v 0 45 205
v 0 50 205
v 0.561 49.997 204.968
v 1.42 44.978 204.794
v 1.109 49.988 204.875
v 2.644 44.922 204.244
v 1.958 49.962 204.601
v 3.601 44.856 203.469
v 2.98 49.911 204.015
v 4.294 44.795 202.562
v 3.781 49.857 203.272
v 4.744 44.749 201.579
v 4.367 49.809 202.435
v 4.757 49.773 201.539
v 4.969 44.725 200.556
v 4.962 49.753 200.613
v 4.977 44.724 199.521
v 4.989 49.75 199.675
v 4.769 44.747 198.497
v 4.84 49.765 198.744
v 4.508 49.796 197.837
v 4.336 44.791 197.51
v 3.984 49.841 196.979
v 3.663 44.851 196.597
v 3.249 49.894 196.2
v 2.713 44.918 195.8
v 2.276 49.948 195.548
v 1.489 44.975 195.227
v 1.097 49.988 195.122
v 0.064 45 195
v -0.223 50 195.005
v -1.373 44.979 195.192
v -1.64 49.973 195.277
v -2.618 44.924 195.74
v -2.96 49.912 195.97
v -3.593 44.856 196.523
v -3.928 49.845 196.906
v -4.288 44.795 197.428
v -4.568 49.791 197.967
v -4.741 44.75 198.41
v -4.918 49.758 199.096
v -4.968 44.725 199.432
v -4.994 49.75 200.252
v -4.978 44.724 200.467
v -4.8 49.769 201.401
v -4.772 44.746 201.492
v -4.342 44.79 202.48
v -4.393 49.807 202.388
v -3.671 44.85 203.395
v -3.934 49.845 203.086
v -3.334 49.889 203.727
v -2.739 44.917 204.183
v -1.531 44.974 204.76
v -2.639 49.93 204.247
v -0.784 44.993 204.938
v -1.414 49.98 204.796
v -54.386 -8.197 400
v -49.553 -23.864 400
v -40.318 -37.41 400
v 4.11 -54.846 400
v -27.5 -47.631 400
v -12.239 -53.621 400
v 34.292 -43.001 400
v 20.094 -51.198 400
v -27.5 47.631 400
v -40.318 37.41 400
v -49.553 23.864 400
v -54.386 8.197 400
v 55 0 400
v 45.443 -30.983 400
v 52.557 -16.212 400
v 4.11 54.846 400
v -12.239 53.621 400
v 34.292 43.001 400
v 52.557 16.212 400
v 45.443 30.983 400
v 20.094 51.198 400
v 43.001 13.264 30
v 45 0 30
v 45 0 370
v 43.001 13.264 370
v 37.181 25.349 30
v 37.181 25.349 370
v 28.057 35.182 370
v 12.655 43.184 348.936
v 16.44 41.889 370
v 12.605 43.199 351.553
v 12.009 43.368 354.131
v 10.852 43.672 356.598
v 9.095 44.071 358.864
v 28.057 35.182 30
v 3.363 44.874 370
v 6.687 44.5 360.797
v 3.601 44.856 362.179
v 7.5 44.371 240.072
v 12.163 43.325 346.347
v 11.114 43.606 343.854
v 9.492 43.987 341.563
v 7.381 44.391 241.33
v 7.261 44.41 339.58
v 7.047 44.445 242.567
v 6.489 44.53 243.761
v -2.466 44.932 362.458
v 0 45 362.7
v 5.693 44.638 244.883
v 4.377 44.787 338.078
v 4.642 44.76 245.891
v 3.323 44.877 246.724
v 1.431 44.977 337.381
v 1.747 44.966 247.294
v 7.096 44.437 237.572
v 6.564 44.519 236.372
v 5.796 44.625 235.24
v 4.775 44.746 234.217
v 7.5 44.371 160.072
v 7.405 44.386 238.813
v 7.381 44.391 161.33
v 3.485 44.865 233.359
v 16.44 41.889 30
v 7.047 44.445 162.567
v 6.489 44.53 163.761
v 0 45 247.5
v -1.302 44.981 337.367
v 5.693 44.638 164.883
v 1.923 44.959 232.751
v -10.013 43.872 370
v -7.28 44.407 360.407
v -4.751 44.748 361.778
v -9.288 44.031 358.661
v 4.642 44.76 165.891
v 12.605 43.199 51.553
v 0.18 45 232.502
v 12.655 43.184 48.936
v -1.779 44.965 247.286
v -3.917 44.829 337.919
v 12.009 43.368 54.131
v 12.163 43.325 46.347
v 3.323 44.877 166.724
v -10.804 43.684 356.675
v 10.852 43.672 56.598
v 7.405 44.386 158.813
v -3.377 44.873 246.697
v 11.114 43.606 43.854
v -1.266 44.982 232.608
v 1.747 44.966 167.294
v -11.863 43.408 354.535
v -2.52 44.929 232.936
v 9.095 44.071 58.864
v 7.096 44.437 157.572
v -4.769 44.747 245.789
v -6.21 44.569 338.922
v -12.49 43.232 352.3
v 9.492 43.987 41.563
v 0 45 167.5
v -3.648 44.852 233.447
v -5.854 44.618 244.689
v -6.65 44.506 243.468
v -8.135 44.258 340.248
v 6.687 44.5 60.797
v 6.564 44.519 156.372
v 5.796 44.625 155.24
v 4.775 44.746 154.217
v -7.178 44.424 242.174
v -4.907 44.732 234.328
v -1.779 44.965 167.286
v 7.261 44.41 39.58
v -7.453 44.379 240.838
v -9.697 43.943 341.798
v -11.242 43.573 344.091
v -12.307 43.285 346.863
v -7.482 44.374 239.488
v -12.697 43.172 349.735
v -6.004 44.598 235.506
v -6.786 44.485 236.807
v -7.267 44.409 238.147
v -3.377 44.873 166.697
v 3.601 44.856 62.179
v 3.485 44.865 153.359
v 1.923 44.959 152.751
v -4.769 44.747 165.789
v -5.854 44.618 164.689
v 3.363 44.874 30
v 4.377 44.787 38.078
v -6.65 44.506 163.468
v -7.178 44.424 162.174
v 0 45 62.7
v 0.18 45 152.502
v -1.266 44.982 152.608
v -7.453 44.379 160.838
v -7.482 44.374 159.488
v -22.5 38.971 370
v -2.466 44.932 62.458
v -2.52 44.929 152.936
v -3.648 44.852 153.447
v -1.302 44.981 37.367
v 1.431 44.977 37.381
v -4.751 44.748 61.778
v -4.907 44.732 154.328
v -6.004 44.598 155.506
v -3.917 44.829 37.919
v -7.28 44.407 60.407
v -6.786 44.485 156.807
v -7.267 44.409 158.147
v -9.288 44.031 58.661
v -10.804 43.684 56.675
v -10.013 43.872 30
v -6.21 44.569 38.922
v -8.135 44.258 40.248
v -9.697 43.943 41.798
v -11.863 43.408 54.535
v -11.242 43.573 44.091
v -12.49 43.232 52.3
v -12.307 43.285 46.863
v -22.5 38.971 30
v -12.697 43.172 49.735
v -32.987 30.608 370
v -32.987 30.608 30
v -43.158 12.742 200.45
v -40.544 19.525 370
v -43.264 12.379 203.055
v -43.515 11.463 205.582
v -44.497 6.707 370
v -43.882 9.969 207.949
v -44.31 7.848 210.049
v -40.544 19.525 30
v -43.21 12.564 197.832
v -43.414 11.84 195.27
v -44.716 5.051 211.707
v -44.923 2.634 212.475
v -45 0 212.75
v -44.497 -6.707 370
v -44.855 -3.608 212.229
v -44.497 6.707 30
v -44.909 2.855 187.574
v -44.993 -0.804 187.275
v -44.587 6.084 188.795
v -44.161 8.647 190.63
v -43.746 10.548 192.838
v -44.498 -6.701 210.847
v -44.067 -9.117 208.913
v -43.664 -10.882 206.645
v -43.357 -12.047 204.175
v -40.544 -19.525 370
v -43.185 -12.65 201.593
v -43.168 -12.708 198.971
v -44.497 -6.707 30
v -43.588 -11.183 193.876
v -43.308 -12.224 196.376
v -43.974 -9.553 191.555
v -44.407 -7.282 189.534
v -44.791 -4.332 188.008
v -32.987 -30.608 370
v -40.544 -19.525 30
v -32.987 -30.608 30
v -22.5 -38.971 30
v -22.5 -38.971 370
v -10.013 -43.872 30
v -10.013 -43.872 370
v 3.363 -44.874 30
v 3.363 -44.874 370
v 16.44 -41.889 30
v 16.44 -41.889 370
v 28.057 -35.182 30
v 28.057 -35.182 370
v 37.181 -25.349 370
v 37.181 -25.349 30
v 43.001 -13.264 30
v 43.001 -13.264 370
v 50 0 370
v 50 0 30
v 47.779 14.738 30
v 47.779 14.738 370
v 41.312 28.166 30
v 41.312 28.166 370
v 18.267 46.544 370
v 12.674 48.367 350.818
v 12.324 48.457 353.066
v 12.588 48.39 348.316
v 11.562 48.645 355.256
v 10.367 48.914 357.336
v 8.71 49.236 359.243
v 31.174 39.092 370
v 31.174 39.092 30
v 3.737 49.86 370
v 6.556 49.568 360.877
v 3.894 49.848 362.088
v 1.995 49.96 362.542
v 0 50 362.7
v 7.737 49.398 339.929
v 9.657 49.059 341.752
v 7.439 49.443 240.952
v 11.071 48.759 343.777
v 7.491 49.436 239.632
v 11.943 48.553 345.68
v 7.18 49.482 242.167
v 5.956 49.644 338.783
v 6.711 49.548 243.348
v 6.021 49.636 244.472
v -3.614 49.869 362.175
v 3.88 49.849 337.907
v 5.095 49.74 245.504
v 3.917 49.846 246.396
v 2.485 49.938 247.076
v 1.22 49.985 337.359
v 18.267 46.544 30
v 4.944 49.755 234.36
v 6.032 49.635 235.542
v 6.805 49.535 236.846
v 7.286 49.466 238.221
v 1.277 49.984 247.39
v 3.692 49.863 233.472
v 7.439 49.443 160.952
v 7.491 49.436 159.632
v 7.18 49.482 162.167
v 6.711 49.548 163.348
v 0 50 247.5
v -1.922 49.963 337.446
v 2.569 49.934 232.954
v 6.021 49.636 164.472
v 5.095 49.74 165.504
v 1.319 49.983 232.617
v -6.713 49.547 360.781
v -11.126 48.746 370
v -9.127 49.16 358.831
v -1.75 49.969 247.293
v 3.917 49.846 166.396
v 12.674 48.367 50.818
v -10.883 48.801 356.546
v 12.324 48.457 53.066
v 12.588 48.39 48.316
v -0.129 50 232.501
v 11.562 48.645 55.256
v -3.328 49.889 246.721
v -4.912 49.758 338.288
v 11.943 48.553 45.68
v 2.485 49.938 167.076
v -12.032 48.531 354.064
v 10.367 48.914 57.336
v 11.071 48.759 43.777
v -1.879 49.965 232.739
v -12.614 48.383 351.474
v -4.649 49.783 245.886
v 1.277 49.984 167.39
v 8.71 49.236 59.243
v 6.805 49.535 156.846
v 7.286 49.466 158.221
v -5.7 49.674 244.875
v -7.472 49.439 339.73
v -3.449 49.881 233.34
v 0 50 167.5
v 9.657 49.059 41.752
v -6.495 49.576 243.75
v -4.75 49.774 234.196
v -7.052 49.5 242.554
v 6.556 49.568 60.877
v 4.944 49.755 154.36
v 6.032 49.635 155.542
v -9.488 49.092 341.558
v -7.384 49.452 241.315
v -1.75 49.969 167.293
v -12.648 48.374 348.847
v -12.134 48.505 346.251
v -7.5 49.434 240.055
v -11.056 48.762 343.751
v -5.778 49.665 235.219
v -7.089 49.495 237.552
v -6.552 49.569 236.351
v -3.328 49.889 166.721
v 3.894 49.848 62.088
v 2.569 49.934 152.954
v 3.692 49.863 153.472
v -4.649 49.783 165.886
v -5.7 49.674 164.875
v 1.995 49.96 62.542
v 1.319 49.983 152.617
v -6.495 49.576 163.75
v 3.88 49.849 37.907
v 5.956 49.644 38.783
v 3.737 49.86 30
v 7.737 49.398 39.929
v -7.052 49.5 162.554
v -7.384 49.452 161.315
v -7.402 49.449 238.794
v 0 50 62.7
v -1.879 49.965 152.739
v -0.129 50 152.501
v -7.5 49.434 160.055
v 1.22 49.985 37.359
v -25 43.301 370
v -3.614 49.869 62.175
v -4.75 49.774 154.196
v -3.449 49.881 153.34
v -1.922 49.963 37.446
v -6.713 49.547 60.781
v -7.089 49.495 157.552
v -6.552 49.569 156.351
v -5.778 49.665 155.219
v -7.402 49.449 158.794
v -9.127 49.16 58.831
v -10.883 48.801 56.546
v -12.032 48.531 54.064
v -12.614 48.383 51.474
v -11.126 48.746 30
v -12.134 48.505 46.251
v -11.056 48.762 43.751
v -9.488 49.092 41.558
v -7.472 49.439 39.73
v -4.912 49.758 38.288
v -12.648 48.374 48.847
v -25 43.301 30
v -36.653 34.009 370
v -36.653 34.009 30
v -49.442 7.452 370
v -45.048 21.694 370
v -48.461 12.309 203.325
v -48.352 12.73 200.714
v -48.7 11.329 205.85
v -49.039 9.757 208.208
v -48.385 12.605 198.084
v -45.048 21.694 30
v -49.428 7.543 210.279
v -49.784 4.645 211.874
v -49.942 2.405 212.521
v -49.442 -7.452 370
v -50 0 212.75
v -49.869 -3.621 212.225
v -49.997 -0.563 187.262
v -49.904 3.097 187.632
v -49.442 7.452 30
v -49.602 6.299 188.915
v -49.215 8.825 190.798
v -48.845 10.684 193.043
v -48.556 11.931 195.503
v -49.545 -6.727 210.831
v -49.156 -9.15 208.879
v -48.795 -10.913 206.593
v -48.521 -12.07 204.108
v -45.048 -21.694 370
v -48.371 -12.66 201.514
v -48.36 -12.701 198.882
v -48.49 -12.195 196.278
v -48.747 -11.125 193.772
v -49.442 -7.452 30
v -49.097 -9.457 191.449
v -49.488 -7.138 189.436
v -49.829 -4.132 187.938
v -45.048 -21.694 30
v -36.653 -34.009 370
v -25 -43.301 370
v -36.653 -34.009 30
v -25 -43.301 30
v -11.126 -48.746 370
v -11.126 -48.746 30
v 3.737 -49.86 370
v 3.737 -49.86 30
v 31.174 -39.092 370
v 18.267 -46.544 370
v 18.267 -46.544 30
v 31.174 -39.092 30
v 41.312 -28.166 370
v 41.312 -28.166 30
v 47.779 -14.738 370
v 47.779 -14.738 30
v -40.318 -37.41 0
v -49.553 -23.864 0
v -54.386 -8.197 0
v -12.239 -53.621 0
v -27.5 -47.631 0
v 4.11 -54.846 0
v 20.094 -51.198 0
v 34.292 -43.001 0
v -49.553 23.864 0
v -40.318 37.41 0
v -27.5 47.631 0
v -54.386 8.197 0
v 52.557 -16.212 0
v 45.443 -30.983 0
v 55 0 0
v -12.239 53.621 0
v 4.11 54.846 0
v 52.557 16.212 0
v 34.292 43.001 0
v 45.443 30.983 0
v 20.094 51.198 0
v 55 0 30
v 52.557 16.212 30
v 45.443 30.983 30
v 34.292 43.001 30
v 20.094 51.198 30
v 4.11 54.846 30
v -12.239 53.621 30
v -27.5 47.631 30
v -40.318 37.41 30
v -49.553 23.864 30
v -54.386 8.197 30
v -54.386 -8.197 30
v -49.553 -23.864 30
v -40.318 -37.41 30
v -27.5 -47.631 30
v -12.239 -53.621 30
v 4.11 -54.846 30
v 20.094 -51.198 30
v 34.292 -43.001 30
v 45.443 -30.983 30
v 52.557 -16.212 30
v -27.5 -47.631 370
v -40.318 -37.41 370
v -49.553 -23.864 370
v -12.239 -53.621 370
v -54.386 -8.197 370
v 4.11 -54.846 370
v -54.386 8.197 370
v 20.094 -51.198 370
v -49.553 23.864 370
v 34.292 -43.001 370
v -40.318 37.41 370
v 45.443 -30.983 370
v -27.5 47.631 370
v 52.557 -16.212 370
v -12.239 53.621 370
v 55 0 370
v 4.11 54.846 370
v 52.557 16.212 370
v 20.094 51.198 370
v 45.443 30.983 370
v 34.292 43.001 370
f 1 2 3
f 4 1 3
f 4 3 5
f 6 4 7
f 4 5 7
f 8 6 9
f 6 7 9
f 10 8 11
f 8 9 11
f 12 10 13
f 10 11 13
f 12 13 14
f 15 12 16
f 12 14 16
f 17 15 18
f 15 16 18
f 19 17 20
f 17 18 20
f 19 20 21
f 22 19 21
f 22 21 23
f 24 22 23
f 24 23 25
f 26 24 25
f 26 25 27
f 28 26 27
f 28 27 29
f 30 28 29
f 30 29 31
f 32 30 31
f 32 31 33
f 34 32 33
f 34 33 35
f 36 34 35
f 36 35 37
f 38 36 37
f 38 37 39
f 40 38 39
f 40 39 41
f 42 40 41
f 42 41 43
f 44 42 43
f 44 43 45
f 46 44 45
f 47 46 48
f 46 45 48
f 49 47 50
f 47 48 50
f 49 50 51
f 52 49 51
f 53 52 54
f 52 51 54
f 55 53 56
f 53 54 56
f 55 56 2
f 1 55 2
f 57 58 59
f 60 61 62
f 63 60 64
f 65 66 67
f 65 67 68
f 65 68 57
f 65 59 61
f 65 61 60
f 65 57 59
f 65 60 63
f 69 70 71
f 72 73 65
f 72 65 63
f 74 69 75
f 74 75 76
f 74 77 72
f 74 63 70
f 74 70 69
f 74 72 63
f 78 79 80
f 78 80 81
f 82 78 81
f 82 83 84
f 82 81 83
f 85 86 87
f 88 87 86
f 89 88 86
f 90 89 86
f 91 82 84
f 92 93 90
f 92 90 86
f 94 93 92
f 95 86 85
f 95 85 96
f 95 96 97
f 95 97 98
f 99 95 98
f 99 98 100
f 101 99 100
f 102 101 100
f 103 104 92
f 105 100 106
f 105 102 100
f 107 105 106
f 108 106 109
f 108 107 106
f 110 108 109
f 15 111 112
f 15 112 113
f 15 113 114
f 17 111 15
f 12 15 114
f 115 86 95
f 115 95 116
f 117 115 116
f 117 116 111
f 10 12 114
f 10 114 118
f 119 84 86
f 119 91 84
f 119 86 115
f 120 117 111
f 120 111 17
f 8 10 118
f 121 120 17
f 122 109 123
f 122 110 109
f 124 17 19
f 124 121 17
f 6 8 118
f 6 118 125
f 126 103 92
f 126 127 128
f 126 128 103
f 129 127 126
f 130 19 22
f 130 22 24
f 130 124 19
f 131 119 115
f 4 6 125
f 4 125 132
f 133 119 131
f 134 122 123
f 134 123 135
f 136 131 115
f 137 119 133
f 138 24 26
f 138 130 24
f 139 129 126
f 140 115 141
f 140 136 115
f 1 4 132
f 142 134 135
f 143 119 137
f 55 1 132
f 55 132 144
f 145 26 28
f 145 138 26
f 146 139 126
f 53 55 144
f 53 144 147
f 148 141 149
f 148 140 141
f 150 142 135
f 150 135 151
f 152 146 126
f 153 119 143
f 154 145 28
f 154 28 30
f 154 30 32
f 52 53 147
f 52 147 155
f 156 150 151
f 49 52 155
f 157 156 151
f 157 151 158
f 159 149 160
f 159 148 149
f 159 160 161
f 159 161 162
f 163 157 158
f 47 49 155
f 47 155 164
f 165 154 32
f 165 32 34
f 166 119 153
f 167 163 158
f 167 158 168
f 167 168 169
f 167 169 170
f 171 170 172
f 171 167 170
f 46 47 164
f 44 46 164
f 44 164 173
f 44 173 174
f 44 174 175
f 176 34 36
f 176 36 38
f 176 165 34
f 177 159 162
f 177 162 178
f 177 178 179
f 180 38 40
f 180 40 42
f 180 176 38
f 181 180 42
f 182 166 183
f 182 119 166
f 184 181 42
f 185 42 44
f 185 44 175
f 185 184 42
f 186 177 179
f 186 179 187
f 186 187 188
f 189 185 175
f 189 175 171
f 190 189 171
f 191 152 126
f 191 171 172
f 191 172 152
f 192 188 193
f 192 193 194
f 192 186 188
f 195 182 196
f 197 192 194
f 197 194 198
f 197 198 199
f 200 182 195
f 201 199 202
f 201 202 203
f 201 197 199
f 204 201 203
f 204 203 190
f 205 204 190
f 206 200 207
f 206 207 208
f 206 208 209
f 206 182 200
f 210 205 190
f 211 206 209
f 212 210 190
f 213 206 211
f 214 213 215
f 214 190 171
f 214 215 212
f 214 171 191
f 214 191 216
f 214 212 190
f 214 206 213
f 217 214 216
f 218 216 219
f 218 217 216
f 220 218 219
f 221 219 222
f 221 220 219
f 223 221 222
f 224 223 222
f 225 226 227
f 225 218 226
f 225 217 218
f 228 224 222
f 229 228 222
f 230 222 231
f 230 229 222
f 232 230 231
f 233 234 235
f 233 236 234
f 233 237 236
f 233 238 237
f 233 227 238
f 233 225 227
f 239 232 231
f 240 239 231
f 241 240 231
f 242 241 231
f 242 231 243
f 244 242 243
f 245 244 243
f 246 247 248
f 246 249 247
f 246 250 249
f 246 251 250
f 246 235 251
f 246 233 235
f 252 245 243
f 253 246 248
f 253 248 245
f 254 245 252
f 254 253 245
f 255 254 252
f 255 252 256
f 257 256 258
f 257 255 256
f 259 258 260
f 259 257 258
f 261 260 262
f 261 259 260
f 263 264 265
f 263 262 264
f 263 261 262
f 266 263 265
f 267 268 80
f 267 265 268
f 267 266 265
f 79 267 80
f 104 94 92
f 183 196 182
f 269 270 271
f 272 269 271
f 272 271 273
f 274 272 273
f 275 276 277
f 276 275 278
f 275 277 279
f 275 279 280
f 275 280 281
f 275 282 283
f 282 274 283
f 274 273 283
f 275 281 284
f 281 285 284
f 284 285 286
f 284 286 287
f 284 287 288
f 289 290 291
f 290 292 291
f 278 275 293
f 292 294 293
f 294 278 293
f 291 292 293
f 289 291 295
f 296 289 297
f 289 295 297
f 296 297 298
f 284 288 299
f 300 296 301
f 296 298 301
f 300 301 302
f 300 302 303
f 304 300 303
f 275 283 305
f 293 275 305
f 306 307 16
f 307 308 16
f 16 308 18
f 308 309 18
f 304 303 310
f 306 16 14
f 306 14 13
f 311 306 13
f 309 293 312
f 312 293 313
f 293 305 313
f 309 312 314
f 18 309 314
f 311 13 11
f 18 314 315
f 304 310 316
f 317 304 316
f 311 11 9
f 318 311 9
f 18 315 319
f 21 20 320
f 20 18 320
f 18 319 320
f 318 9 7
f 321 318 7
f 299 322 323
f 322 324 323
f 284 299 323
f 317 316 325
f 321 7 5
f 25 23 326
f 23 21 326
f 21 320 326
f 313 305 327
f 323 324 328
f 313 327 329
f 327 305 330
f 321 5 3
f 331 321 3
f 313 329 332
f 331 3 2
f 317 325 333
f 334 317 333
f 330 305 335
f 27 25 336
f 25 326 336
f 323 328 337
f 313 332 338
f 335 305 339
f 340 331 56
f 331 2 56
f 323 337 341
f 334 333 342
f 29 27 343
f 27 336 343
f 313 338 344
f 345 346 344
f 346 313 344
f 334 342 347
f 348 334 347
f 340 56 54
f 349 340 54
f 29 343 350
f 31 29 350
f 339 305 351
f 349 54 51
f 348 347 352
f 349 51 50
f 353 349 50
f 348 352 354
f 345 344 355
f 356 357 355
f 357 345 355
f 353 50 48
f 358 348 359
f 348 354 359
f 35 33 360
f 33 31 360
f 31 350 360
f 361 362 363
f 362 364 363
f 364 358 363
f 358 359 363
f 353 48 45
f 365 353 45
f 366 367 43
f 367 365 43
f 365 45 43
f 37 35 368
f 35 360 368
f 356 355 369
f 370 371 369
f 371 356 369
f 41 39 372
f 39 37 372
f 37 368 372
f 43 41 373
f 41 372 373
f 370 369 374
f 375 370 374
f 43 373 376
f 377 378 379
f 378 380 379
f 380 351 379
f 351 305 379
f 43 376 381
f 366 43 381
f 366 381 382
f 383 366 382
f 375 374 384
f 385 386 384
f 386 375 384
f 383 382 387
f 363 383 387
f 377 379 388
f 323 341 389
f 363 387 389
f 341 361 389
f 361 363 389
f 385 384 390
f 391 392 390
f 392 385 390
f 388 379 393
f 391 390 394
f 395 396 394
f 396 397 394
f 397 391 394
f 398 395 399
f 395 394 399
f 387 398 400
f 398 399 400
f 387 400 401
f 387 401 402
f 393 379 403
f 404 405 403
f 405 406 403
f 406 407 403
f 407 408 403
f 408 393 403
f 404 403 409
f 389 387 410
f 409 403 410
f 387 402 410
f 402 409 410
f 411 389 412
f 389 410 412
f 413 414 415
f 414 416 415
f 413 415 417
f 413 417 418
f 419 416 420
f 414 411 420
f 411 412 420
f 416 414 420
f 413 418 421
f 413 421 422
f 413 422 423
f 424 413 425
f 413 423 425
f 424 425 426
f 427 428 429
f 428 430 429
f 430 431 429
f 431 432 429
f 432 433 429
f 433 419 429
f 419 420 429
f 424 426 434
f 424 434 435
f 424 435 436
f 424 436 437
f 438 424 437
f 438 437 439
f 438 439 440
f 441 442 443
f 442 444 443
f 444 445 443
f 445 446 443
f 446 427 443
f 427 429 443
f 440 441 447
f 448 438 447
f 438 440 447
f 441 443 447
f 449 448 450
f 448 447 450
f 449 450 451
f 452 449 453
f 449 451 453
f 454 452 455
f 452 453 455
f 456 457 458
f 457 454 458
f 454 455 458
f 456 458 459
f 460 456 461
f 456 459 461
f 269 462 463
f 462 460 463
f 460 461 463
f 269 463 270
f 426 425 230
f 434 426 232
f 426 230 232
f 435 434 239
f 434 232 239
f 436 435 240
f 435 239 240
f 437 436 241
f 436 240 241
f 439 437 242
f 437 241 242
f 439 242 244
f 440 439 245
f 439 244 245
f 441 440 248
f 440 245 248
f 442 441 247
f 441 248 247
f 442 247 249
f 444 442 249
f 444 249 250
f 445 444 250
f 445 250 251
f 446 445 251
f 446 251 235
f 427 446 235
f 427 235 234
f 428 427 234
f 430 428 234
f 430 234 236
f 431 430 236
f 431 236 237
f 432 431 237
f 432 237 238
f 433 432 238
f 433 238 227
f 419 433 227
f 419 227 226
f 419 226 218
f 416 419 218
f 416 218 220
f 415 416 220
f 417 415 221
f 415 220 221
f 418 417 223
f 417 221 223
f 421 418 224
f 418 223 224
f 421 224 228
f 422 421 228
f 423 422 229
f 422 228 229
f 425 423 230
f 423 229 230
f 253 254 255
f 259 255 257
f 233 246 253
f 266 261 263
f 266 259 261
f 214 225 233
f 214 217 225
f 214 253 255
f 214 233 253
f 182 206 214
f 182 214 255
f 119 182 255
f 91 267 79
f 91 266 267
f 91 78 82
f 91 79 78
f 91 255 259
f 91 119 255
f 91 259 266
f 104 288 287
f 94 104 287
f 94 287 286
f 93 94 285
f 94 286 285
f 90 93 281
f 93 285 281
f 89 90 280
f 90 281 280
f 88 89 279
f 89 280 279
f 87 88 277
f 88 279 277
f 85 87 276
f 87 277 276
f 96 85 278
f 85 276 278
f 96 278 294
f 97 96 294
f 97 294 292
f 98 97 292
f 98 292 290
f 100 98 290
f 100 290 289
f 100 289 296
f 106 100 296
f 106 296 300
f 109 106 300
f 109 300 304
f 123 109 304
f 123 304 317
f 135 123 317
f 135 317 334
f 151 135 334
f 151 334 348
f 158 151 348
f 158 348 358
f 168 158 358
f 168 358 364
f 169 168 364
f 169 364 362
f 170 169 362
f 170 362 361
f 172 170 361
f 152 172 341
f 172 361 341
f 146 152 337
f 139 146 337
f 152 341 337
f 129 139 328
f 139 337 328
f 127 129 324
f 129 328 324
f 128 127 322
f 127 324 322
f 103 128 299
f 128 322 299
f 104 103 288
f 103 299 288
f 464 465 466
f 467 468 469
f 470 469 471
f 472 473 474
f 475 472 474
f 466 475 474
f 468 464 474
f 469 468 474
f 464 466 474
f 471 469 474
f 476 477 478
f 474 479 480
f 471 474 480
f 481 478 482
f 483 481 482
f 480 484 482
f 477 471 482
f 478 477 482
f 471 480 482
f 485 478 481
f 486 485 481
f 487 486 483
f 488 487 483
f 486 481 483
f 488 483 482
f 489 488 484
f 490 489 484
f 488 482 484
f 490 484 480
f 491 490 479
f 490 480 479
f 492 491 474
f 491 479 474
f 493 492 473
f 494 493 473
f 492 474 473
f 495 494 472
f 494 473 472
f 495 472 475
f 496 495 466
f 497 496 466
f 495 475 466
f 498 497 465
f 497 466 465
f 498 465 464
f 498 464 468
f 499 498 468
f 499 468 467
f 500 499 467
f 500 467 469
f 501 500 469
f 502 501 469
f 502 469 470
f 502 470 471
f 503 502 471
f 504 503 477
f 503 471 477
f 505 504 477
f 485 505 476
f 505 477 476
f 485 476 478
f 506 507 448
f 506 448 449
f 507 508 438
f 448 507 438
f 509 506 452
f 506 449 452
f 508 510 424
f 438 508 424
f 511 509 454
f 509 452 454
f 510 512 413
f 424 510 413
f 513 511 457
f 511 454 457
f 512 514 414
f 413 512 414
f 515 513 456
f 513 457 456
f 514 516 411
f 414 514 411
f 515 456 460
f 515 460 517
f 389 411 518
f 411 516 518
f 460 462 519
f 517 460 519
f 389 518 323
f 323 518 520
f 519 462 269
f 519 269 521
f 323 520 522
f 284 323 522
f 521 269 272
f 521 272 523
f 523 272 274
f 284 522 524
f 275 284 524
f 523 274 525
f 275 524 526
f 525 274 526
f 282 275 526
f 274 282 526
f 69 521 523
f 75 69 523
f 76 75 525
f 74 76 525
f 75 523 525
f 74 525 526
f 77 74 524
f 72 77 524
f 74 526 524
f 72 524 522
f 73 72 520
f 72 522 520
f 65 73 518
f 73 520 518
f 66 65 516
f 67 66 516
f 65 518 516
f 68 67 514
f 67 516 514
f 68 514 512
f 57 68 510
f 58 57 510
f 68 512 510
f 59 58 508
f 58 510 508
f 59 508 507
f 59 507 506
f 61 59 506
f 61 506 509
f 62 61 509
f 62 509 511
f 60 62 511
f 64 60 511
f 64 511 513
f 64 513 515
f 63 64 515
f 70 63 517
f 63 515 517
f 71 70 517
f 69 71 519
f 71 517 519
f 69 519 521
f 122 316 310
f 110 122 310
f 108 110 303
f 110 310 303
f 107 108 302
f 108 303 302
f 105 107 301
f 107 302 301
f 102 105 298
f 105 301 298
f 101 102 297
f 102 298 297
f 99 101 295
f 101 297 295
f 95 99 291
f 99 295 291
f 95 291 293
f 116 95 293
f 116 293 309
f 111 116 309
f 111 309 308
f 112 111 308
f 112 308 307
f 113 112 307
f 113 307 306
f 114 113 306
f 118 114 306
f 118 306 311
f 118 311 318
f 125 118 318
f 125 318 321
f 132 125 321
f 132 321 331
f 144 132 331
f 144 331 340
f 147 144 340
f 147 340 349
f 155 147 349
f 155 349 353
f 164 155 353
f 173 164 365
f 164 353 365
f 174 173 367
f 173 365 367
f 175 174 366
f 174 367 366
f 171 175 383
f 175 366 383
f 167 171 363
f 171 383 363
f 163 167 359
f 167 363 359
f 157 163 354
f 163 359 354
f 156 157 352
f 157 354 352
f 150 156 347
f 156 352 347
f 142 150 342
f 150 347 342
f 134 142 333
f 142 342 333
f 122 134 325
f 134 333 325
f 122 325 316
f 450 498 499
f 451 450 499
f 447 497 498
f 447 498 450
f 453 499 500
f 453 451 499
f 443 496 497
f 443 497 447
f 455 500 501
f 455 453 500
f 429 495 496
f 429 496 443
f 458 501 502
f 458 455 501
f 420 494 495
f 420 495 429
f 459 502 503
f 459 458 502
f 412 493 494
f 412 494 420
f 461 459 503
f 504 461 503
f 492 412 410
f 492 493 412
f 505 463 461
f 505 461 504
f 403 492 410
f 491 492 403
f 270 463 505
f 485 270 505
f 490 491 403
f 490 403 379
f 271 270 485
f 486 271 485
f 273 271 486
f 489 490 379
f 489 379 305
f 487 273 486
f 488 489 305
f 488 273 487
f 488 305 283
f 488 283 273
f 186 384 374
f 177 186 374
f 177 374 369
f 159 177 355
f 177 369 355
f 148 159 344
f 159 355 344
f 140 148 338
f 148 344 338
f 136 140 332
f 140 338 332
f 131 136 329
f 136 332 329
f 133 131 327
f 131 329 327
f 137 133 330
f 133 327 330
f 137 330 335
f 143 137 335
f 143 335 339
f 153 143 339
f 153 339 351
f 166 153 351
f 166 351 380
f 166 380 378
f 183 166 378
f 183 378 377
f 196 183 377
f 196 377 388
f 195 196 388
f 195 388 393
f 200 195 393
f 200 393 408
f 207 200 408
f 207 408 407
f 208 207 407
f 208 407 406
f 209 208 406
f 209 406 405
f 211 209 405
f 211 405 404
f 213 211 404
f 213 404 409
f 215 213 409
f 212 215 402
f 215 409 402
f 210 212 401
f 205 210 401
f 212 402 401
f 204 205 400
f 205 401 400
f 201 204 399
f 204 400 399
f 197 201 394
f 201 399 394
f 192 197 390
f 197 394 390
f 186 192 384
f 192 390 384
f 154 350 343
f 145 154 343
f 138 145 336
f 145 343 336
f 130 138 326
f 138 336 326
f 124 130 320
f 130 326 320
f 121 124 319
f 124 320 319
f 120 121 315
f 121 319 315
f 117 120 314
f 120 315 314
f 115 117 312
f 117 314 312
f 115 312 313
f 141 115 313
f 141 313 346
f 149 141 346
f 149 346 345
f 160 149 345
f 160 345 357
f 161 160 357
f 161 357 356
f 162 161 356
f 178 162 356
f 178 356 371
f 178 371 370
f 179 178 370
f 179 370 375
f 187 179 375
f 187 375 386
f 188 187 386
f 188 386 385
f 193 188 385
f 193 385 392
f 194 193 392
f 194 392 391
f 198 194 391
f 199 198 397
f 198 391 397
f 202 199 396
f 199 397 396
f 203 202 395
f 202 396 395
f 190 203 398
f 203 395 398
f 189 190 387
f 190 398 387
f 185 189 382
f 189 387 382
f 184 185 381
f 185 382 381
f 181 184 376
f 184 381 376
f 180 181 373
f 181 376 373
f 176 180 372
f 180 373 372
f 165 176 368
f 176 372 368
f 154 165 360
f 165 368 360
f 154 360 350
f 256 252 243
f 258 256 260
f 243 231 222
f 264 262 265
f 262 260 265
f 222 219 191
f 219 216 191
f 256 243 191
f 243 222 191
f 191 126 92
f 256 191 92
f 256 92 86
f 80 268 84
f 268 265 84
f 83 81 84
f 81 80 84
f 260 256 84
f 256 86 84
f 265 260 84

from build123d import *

# Parameters (mm, degrees)
CROQUIS1_R              = 50
CROQUIS1_R_2            = 45
SALIENTE_EXTRUIR1_DEPTH = 400
CROQUIS2_R              = 55
SALIENTE_EXTRUIR2_DEPTH = 30
SALIENTE_EXTRUIR3_START = -30
CROQUIS3_R              = 55
SALIENTE_EXTRUIR3_DEPTH = 30
CROQUIS4_R              = 12.75
CORTAR_EXTRUIR1_DEPTH   = 179
CROQUIS5_R              = 7.5
CROQUIS5_R_2            = 5
CROQUIS5_R_3            = 12.7
CORTAR_EXTRUIR2_DEPTH   = 60


with BuildPart() as part:
    # Croquis1 → Saliente-Extruir1 (new body)
    with BuildSketch(Plane.XY):
        Circle(CROQUIS1_R)
        Circle(CROQUIS1_R_2, mode=Mode.SUBTRACT)
    extrude(amount=SALIENTE_EXTRUIR1_DEPTH)

    # Croquis2 → Saliente-Extruir2 (add)
    with BuildSketch(Plane.XY):
        Circle(CROQUIS2_R)
    extrude(amount=SALIENTE_EXTRUIR2_DEPTH)

    # Croquis3 → Saliente-Extruir3 (add)
    with BuildSketch(Plane.XY.offset(400).offset(SALIENTE_EXTRUIR3_START)):
        Circle(CROQUIS3_R)
    extrude(amount=SALIENTE_EXTRUIR3_DEPTH)

    # Croquis4 → Cortar-Extruir1 (cut)
    with BuildSketch(Plane(origin=(0, 0, 0), x_dir=(0, 0, -1), z_dir=(1, 0, 0))):
        with Locations(Location((-200, 0, 0), (0, 0, 180))):
            Circle(CROQUIS4_R)
    extrude(amount=-CORTAR_EXTRUIR1_DEPTH, mode=Mode.SUBTRACT)

    # Croquis5 → Cortar-Extruir2 (cut)
    with BuildSketch(Plane(origin=(0, 50, 0), x_dir=(1, 0, 0), z_dir=(0, 1, 0))):
        with Locations(Location((0, -240, 0), (0, 0, 270))):
            Circle(CROQUIS5_R)
        with Locations(Location((0, -160, 0), (0, 0, 270))):
            Circle(CROQUIS5_R)
        with Locations(Location((0, -200, 0), (0, 0, 270))):
            Circle(CROQUIS5_R_2)
        with Locations(Location((0, -350, 0), (0, 0, 270))):
            Circle(CROQUIS5_R_3)
        with Locations(Location((0, -50, 0), (0, 0, 270))):
            Circle(CROQUIS5_R_3)
    extrude(amount=-CORTAR_EXTRUIR2_DEPTH, mode=Mode.SUBTRACT)


solid = part.part
